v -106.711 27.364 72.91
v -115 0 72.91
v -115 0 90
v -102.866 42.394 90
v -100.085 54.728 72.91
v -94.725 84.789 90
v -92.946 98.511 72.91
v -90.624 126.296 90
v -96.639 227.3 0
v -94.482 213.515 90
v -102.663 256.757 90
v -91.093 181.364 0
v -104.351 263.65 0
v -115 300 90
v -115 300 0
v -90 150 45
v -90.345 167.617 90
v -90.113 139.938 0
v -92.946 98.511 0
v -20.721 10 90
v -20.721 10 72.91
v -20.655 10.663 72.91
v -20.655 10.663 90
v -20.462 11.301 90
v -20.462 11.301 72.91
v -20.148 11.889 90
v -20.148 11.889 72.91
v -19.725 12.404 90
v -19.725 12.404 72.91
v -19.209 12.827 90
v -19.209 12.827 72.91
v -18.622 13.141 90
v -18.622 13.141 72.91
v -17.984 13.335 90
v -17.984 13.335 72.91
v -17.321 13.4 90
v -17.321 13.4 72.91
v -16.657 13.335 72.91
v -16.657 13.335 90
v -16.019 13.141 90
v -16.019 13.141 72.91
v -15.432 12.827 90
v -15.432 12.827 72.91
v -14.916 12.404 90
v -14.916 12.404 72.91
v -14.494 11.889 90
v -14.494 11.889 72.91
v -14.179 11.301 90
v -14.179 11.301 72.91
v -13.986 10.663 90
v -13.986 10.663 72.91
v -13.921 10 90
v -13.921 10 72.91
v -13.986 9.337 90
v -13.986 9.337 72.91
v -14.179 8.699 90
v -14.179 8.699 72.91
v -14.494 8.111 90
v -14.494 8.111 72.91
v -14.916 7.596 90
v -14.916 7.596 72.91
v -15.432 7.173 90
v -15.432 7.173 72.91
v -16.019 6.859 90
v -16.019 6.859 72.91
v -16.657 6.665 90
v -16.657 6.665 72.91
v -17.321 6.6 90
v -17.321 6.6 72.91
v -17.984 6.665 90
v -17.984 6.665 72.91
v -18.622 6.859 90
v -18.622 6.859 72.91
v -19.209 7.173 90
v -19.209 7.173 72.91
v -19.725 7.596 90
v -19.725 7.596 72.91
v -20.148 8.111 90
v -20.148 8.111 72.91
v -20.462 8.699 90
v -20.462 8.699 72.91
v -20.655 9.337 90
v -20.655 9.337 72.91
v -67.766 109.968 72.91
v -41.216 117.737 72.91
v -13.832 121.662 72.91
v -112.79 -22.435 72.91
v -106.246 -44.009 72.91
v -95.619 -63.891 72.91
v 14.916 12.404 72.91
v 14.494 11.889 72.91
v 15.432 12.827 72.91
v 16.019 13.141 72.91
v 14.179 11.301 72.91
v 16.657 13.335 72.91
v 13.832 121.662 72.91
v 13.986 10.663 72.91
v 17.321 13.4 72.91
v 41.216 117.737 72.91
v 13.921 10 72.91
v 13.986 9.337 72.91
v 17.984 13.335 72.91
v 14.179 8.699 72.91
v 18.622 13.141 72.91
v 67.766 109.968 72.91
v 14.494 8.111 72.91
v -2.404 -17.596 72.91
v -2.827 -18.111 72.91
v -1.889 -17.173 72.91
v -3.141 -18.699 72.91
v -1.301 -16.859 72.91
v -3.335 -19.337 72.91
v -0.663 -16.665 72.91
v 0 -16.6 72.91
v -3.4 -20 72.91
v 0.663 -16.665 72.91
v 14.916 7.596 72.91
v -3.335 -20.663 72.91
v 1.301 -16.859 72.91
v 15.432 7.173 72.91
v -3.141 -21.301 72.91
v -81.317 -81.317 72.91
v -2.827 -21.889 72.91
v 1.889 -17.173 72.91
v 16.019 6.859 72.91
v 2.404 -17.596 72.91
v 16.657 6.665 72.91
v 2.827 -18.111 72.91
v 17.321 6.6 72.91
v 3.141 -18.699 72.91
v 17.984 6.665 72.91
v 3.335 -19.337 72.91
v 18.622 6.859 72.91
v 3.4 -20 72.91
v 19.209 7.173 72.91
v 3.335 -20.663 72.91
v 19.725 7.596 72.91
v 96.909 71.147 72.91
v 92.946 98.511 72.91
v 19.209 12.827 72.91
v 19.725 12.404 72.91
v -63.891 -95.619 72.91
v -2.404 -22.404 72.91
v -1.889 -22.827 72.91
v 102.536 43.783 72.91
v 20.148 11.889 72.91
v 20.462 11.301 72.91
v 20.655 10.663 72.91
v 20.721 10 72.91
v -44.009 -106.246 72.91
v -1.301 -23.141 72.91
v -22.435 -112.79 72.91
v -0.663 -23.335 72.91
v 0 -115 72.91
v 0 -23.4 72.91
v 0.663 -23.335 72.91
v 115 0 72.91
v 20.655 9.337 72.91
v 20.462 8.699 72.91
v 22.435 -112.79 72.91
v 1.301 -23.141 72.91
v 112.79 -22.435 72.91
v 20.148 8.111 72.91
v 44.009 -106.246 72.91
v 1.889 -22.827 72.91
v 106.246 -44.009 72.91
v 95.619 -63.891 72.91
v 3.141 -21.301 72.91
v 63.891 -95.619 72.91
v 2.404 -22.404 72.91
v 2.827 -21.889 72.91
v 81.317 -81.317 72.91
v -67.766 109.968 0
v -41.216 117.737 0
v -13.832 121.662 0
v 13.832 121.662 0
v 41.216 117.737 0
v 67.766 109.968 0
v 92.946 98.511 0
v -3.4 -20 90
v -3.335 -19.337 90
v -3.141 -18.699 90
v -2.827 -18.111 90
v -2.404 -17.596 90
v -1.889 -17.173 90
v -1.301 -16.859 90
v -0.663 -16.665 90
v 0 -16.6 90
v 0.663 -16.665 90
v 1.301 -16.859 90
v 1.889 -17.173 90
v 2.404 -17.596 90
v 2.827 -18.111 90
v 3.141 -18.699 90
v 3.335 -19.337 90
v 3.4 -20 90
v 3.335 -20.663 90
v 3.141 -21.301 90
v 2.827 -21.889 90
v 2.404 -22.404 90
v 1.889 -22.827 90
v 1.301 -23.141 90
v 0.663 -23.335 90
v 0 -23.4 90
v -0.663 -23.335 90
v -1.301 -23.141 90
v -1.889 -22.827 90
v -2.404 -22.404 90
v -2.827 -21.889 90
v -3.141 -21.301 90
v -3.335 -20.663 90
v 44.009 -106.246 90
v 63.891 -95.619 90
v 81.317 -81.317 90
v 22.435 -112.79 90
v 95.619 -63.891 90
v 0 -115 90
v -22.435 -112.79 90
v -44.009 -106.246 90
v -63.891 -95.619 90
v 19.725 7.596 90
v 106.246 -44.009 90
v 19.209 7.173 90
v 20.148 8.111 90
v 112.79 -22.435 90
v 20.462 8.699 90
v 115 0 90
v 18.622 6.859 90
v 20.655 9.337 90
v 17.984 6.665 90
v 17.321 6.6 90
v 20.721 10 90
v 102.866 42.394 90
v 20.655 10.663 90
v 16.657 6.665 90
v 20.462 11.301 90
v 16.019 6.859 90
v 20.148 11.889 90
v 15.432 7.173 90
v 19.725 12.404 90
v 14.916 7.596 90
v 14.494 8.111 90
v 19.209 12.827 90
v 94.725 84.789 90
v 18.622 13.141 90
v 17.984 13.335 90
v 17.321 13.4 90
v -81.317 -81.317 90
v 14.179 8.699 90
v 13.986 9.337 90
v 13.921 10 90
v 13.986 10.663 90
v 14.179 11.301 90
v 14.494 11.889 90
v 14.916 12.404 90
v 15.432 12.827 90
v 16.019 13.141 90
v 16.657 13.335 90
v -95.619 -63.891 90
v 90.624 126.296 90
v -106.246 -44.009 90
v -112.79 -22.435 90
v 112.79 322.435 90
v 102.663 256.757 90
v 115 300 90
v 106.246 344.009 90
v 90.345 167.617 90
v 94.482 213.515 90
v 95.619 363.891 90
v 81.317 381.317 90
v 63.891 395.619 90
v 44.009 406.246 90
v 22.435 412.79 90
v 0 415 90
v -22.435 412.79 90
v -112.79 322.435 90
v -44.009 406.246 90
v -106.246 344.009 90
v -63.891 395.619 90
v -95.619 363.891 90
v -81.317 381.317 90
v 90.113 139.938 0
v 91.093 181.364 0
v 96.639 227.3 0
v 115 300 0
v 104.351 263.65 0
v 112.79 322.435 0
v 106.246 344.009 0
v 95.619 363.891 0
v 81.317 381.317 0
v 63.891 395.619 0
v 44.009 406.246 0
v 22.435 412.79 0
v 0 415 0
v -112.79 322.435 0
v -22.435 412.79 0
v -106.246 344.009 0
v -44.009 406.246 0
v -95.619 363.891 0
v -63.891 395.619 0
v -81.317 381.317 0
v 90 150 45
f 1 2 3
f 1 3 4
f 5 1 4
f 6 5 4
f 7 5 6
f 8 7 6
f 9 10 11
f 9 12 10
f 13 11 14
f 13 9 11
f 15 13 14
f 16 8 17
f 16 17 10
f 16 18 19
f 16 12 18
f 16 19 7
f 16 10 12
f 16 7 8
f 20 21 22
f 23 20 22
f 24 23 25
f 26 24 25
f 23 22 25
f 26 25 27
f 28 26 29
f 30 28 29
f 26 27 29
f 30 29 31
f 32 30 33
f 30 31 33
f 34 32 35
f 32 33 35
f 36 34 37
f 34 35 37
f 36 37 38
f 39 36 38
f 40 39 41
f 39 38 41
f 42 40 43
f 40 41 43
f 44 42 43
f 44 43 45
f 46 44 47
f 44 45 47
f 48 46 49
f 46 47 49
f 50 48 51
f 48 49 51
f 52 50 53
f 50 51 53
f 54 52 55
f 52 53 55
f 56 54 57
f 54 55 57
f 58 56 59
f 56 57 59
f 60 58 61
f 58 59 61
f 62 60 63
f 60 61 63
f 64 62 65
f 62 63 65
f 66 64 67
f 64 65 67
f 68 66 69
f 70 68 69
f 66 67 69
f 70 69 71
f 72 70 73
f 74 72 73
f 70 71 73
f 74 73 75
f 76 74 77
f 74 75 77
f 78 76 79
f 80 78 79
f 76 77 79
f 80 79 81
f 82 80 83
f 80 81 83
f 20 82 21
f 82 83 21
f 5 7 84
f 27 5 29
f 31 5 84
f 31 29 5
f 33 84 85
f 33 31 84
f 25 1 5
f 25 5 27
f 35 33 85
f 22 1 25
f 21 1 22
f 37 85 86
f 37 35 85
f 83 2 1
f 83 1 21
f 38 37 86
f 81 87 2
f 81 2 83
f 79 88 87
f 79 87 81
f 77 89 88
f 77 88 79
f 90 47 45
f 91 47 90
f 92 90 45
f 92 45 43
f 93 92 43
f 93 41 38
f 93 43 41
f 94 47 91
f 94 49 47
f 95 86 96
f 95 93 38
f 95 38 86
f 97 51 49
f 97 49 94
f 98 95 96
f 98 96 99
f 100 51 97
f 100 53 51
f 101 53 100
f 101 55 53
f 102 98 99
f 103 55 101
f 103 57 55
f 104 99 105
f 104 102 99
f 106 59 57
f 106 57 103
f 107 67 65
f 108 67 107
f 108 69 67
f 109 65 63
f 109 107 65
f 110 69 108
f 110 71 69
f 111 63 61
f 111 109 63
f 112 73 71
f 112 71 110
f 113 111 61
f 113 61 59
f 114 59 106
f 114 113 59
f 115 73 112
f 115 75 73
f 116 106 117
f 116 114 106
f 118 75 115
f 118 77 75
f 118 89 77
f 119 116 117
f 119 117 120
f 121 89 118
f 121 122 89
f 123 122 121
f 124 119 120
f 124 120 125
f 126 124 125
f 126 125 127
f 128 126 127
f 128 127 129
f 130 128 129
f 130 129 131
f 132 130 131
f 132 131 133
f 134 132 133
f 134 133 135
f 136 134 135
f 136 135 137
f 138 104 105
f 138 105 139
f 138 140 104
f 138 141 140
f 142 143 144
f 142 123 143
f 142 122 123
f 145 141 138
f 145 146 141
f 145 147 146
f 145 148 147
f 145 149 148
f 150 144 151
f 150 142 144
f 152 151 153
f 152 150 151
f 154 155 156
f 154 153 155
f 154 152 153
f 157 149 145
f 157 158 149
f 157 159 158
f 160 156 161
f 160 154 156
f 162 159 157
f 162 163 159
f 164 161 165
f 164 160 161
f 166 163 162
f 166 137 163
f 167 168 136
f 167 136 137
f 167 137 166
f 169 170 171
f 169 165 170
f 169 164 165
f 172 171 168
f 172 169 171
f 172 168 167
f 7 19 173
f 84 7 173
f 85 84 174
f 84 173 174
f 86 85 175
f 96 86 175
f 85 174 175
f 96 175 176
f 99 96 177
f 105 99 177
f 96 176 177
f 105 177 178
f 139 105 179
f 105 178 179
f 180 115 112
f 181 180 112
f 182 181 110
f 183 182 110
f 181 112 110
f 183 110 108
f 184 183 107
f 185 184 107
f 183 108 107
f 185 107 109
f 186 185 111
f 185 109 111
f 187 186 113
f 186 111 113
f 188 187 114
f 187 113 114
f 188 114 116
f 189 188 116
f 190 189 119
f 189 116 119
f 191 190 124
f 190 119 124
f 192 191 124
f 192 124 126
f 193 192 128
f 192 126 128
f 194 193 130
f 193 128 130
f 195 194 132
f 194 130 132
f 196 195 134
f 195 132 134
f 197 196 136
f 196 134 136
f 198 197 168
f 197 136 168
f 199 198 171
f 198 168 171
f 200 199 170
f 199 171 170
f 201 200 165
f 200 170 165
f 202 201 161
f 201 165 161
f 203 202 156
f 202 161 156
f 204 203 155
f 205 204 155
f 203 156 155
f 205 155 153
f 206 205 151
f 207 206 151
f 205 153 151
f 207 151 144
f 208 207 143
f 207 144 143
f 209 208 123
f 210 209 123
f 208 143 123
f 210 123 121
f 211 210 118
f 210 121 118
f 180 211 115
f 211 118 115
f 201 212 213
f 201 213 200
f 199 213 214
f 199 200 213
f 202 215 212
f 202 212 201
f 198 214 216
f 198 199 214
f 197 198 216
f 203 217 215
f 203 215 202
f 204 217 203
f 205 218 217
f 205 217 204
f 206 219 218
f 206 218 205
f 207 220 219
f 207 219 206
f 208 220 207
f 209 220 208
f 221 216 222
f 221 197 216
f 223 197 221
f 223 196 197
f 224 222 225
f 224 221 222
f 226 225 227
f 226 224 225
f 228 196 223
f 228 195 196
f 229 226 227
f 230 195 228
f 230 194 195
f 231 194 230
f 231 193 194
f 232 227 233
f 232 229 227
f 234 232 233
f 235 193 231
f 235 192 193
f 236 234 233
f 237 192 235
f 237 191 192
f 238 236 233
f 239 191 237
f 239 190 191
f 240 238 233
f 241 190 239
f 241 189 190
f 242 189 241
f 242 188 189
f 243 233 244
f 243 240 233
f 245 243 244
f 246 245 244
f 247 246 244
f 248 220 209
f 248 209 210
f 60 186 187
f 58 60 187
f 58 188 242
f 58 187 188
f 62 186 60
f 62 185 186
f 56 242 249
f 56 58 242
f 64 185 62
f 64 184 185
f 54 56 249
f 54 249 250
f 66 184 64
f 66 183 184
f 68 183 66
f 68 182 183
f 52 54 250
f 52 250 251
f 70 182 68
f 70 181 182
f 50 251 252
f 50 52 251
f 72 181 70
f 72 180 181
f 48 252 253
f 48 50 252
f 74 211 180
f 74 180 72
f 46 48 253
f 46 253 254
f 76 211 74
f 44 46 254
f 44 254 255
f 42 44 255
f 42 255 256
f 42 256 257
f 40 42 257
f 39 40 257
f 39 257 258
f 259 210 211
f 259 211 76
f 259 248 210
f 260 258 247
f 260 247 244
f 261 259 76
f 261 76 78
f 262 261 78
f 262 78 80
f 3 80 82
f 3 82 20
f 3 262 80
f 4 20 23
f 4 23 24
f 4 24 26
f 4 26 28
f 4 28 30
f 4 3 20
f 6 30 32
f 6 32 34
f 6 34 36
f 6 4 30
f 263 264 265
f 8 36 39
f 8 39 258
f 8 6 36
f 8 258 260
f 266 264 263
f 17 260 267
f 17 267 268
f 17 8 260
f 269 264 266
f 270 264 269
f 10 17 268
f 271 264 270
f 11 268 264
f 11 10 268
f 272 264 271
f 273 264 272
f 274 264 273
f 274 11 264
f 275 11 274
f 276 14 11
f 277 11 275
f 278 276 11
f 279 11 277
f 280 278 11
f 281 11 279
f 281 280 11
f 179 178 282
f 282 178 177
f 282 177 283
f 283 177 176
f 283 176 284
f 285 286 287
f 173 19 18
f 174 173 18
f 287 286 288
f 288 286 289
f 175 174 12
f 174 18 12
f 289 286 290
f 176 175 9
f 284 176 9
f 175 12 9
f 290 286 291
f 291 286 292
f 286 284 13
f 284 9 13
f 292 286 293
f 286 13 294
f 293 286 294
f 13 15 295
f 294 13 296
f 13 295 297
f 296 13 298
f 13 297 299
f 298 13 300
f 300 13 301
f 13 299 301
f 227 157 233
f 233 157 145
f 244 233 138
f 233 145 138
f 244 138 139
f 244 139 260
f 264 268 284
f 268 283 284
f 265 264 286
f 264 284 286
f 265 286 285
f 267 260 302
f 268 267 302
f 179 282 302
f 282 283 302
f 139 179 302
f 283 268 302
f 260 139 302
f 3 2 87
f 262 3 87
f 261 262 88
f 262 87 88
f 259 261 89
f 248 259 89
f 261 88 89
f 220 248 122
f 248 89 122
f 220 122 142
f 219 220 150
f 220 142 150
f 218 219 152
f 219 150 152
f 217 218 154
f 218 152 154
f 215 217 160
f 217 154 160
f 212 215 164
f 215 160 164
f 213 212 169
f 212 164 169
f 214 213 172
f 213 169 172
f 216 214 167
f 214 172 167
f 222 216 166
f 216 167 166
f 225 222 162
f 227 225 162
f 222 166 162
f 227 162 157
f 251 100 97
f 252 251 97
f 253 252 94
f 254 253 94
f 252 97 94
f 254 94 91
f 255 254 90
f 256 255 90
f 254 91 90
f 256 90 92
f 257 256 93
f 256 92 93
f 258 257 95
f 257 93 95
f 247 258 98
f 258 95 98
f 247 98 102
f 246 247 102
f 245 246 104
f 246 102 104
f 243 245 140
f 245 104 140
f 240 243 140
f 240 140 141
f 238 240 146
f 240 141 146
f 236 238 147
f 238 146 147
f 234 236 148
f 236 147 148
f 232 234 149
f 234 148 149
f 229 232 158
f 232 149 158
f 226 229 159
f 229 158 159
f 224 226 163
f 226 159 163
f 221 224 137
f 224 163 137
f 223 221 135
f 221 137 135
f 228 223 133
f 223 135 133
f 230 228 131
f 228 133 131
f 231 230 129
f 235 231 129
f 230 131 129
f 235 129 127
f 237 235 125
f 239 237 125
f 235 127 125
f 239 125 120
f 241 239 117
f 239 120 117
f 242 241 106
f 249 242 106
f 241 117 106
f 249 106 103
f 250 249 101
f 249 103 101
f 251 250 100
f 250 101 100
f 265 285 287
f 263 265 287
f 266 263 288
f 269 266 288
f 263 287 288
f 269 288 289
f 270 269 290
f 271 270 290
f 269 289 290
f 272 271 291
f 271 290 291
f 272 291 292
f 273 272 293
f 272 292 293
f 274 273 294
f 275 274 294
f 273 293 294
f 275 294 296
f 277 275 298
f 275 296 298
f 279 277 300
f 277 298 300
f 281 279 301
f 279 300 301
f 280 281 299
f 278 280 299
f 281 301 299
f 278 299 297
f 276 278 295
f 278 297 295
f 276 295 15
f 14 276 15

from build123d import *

# Parameters (mm, degrees)
BOSS_EXTRUDE1_DEPTH = 90
SKETCH2_R           = 97.5
CUT_EXTRUDE1_DEPTH  = 72.91
CUT_EXTRUDE10_DEPTH = 72.91
SKETCH13_R          = 3.4
CUT_EXTRUDE13_DEPTH = 17.09


with BuildPart() as part:
    # Sketch1 → Boss-Extrude1 (new body)
    with BuildSketch(Plane(origin=(0, 0, 0), x_dir=(0, 1, 0), z_dir=(0, 0, 1))):
        with BuildLine():
            ThreePointArc((0, 115), (-115, 0), (0, -115))
            add(Edge.make_bspline(
                [(0, -115), (150, -65), (300, -115)],
                knots=[0, 0, 0, 1, 1, 1], degree=2))
            ThreePointArc((300, -115), (415, 0), (300, 115))
            add(Edge.make_bspline(
                [(0, 115), (150, 65), (300, 115)],
                knots=[0, 0, 0, 1, 1, 1], degree=2))
        make_face()
    extrude(amount=BOSS_EXTRUDE1_DEPTH)

    # Sketch2 → Cut-Extrude1 (cut)
    with BuildSketch(Plane(origin=(0, 0, 0), x_dir=(1, 0, 0), z_dir=(0, 0, -1))):
        with Locations(Location((0, 0, 0), (0, 0, 180))):
            Circle(SKETCH2_R)
    extrude(amount=-CUT_EXTRUDE1_DEPTH, mode=Mode.SUBTRACT)

    # Sketch10 → Cut-Extrude10 (cut)
    with BuildSketch(Plane(origin=(0, 0, 0), x_dir=(1, 0, 0), z_dir=(0, 0, -1))):
        with BuildLine():
            ThreePointArc((115, 0), (0, 115), (-115, 0))
            add(Edge.make_bspline(
                [(-92.945702649, -98.510851787), (-98.581524702, -49.255425893), (-115, 0)],
                knots=[0, 0, 0, 1, 1, 1], degree=2))
            ThreePointArc((-92.945702649, -98.510851787), (0, -122.154138558), (92.945702649, -98.510851787))
            add(Edge.make_bspline(
                [(115, 0), (98.581524702, -49.255425893), (92.945702649, -98.510851787)],
                knots=[0, 0, 0, 1, 1, 1], degree=2))
        make_face()
    extrude(amount=-CUT_EXTRUDE10_DEPTH, mode=Mode.SUBTRACT)

    # Sketch13 → Cut-Extrude13 (cut)
    with BuildSketch(Plane(origin=(0, 0, 72.91), x_dir=(1, 0, 0), z_dir=(0, 0, -1))):
        with Locations(Location((0, 20, 0), (0, 0, 180))):
            Circle(SKETCH13_R)
        with Locations(Location((-17.320508076, -10, 0), (0, 0, 180))):
            Circle(SKETCH13_R)
        with Locations(Location((17.320508076, -10, 0), (0, 0, 180))):
            Circle(SKETCH13_R)
    extrude(amount=-CUT_EXTRUDE13_DEPTH, mode=Mode.SUBTRACT)


solid = part.part
